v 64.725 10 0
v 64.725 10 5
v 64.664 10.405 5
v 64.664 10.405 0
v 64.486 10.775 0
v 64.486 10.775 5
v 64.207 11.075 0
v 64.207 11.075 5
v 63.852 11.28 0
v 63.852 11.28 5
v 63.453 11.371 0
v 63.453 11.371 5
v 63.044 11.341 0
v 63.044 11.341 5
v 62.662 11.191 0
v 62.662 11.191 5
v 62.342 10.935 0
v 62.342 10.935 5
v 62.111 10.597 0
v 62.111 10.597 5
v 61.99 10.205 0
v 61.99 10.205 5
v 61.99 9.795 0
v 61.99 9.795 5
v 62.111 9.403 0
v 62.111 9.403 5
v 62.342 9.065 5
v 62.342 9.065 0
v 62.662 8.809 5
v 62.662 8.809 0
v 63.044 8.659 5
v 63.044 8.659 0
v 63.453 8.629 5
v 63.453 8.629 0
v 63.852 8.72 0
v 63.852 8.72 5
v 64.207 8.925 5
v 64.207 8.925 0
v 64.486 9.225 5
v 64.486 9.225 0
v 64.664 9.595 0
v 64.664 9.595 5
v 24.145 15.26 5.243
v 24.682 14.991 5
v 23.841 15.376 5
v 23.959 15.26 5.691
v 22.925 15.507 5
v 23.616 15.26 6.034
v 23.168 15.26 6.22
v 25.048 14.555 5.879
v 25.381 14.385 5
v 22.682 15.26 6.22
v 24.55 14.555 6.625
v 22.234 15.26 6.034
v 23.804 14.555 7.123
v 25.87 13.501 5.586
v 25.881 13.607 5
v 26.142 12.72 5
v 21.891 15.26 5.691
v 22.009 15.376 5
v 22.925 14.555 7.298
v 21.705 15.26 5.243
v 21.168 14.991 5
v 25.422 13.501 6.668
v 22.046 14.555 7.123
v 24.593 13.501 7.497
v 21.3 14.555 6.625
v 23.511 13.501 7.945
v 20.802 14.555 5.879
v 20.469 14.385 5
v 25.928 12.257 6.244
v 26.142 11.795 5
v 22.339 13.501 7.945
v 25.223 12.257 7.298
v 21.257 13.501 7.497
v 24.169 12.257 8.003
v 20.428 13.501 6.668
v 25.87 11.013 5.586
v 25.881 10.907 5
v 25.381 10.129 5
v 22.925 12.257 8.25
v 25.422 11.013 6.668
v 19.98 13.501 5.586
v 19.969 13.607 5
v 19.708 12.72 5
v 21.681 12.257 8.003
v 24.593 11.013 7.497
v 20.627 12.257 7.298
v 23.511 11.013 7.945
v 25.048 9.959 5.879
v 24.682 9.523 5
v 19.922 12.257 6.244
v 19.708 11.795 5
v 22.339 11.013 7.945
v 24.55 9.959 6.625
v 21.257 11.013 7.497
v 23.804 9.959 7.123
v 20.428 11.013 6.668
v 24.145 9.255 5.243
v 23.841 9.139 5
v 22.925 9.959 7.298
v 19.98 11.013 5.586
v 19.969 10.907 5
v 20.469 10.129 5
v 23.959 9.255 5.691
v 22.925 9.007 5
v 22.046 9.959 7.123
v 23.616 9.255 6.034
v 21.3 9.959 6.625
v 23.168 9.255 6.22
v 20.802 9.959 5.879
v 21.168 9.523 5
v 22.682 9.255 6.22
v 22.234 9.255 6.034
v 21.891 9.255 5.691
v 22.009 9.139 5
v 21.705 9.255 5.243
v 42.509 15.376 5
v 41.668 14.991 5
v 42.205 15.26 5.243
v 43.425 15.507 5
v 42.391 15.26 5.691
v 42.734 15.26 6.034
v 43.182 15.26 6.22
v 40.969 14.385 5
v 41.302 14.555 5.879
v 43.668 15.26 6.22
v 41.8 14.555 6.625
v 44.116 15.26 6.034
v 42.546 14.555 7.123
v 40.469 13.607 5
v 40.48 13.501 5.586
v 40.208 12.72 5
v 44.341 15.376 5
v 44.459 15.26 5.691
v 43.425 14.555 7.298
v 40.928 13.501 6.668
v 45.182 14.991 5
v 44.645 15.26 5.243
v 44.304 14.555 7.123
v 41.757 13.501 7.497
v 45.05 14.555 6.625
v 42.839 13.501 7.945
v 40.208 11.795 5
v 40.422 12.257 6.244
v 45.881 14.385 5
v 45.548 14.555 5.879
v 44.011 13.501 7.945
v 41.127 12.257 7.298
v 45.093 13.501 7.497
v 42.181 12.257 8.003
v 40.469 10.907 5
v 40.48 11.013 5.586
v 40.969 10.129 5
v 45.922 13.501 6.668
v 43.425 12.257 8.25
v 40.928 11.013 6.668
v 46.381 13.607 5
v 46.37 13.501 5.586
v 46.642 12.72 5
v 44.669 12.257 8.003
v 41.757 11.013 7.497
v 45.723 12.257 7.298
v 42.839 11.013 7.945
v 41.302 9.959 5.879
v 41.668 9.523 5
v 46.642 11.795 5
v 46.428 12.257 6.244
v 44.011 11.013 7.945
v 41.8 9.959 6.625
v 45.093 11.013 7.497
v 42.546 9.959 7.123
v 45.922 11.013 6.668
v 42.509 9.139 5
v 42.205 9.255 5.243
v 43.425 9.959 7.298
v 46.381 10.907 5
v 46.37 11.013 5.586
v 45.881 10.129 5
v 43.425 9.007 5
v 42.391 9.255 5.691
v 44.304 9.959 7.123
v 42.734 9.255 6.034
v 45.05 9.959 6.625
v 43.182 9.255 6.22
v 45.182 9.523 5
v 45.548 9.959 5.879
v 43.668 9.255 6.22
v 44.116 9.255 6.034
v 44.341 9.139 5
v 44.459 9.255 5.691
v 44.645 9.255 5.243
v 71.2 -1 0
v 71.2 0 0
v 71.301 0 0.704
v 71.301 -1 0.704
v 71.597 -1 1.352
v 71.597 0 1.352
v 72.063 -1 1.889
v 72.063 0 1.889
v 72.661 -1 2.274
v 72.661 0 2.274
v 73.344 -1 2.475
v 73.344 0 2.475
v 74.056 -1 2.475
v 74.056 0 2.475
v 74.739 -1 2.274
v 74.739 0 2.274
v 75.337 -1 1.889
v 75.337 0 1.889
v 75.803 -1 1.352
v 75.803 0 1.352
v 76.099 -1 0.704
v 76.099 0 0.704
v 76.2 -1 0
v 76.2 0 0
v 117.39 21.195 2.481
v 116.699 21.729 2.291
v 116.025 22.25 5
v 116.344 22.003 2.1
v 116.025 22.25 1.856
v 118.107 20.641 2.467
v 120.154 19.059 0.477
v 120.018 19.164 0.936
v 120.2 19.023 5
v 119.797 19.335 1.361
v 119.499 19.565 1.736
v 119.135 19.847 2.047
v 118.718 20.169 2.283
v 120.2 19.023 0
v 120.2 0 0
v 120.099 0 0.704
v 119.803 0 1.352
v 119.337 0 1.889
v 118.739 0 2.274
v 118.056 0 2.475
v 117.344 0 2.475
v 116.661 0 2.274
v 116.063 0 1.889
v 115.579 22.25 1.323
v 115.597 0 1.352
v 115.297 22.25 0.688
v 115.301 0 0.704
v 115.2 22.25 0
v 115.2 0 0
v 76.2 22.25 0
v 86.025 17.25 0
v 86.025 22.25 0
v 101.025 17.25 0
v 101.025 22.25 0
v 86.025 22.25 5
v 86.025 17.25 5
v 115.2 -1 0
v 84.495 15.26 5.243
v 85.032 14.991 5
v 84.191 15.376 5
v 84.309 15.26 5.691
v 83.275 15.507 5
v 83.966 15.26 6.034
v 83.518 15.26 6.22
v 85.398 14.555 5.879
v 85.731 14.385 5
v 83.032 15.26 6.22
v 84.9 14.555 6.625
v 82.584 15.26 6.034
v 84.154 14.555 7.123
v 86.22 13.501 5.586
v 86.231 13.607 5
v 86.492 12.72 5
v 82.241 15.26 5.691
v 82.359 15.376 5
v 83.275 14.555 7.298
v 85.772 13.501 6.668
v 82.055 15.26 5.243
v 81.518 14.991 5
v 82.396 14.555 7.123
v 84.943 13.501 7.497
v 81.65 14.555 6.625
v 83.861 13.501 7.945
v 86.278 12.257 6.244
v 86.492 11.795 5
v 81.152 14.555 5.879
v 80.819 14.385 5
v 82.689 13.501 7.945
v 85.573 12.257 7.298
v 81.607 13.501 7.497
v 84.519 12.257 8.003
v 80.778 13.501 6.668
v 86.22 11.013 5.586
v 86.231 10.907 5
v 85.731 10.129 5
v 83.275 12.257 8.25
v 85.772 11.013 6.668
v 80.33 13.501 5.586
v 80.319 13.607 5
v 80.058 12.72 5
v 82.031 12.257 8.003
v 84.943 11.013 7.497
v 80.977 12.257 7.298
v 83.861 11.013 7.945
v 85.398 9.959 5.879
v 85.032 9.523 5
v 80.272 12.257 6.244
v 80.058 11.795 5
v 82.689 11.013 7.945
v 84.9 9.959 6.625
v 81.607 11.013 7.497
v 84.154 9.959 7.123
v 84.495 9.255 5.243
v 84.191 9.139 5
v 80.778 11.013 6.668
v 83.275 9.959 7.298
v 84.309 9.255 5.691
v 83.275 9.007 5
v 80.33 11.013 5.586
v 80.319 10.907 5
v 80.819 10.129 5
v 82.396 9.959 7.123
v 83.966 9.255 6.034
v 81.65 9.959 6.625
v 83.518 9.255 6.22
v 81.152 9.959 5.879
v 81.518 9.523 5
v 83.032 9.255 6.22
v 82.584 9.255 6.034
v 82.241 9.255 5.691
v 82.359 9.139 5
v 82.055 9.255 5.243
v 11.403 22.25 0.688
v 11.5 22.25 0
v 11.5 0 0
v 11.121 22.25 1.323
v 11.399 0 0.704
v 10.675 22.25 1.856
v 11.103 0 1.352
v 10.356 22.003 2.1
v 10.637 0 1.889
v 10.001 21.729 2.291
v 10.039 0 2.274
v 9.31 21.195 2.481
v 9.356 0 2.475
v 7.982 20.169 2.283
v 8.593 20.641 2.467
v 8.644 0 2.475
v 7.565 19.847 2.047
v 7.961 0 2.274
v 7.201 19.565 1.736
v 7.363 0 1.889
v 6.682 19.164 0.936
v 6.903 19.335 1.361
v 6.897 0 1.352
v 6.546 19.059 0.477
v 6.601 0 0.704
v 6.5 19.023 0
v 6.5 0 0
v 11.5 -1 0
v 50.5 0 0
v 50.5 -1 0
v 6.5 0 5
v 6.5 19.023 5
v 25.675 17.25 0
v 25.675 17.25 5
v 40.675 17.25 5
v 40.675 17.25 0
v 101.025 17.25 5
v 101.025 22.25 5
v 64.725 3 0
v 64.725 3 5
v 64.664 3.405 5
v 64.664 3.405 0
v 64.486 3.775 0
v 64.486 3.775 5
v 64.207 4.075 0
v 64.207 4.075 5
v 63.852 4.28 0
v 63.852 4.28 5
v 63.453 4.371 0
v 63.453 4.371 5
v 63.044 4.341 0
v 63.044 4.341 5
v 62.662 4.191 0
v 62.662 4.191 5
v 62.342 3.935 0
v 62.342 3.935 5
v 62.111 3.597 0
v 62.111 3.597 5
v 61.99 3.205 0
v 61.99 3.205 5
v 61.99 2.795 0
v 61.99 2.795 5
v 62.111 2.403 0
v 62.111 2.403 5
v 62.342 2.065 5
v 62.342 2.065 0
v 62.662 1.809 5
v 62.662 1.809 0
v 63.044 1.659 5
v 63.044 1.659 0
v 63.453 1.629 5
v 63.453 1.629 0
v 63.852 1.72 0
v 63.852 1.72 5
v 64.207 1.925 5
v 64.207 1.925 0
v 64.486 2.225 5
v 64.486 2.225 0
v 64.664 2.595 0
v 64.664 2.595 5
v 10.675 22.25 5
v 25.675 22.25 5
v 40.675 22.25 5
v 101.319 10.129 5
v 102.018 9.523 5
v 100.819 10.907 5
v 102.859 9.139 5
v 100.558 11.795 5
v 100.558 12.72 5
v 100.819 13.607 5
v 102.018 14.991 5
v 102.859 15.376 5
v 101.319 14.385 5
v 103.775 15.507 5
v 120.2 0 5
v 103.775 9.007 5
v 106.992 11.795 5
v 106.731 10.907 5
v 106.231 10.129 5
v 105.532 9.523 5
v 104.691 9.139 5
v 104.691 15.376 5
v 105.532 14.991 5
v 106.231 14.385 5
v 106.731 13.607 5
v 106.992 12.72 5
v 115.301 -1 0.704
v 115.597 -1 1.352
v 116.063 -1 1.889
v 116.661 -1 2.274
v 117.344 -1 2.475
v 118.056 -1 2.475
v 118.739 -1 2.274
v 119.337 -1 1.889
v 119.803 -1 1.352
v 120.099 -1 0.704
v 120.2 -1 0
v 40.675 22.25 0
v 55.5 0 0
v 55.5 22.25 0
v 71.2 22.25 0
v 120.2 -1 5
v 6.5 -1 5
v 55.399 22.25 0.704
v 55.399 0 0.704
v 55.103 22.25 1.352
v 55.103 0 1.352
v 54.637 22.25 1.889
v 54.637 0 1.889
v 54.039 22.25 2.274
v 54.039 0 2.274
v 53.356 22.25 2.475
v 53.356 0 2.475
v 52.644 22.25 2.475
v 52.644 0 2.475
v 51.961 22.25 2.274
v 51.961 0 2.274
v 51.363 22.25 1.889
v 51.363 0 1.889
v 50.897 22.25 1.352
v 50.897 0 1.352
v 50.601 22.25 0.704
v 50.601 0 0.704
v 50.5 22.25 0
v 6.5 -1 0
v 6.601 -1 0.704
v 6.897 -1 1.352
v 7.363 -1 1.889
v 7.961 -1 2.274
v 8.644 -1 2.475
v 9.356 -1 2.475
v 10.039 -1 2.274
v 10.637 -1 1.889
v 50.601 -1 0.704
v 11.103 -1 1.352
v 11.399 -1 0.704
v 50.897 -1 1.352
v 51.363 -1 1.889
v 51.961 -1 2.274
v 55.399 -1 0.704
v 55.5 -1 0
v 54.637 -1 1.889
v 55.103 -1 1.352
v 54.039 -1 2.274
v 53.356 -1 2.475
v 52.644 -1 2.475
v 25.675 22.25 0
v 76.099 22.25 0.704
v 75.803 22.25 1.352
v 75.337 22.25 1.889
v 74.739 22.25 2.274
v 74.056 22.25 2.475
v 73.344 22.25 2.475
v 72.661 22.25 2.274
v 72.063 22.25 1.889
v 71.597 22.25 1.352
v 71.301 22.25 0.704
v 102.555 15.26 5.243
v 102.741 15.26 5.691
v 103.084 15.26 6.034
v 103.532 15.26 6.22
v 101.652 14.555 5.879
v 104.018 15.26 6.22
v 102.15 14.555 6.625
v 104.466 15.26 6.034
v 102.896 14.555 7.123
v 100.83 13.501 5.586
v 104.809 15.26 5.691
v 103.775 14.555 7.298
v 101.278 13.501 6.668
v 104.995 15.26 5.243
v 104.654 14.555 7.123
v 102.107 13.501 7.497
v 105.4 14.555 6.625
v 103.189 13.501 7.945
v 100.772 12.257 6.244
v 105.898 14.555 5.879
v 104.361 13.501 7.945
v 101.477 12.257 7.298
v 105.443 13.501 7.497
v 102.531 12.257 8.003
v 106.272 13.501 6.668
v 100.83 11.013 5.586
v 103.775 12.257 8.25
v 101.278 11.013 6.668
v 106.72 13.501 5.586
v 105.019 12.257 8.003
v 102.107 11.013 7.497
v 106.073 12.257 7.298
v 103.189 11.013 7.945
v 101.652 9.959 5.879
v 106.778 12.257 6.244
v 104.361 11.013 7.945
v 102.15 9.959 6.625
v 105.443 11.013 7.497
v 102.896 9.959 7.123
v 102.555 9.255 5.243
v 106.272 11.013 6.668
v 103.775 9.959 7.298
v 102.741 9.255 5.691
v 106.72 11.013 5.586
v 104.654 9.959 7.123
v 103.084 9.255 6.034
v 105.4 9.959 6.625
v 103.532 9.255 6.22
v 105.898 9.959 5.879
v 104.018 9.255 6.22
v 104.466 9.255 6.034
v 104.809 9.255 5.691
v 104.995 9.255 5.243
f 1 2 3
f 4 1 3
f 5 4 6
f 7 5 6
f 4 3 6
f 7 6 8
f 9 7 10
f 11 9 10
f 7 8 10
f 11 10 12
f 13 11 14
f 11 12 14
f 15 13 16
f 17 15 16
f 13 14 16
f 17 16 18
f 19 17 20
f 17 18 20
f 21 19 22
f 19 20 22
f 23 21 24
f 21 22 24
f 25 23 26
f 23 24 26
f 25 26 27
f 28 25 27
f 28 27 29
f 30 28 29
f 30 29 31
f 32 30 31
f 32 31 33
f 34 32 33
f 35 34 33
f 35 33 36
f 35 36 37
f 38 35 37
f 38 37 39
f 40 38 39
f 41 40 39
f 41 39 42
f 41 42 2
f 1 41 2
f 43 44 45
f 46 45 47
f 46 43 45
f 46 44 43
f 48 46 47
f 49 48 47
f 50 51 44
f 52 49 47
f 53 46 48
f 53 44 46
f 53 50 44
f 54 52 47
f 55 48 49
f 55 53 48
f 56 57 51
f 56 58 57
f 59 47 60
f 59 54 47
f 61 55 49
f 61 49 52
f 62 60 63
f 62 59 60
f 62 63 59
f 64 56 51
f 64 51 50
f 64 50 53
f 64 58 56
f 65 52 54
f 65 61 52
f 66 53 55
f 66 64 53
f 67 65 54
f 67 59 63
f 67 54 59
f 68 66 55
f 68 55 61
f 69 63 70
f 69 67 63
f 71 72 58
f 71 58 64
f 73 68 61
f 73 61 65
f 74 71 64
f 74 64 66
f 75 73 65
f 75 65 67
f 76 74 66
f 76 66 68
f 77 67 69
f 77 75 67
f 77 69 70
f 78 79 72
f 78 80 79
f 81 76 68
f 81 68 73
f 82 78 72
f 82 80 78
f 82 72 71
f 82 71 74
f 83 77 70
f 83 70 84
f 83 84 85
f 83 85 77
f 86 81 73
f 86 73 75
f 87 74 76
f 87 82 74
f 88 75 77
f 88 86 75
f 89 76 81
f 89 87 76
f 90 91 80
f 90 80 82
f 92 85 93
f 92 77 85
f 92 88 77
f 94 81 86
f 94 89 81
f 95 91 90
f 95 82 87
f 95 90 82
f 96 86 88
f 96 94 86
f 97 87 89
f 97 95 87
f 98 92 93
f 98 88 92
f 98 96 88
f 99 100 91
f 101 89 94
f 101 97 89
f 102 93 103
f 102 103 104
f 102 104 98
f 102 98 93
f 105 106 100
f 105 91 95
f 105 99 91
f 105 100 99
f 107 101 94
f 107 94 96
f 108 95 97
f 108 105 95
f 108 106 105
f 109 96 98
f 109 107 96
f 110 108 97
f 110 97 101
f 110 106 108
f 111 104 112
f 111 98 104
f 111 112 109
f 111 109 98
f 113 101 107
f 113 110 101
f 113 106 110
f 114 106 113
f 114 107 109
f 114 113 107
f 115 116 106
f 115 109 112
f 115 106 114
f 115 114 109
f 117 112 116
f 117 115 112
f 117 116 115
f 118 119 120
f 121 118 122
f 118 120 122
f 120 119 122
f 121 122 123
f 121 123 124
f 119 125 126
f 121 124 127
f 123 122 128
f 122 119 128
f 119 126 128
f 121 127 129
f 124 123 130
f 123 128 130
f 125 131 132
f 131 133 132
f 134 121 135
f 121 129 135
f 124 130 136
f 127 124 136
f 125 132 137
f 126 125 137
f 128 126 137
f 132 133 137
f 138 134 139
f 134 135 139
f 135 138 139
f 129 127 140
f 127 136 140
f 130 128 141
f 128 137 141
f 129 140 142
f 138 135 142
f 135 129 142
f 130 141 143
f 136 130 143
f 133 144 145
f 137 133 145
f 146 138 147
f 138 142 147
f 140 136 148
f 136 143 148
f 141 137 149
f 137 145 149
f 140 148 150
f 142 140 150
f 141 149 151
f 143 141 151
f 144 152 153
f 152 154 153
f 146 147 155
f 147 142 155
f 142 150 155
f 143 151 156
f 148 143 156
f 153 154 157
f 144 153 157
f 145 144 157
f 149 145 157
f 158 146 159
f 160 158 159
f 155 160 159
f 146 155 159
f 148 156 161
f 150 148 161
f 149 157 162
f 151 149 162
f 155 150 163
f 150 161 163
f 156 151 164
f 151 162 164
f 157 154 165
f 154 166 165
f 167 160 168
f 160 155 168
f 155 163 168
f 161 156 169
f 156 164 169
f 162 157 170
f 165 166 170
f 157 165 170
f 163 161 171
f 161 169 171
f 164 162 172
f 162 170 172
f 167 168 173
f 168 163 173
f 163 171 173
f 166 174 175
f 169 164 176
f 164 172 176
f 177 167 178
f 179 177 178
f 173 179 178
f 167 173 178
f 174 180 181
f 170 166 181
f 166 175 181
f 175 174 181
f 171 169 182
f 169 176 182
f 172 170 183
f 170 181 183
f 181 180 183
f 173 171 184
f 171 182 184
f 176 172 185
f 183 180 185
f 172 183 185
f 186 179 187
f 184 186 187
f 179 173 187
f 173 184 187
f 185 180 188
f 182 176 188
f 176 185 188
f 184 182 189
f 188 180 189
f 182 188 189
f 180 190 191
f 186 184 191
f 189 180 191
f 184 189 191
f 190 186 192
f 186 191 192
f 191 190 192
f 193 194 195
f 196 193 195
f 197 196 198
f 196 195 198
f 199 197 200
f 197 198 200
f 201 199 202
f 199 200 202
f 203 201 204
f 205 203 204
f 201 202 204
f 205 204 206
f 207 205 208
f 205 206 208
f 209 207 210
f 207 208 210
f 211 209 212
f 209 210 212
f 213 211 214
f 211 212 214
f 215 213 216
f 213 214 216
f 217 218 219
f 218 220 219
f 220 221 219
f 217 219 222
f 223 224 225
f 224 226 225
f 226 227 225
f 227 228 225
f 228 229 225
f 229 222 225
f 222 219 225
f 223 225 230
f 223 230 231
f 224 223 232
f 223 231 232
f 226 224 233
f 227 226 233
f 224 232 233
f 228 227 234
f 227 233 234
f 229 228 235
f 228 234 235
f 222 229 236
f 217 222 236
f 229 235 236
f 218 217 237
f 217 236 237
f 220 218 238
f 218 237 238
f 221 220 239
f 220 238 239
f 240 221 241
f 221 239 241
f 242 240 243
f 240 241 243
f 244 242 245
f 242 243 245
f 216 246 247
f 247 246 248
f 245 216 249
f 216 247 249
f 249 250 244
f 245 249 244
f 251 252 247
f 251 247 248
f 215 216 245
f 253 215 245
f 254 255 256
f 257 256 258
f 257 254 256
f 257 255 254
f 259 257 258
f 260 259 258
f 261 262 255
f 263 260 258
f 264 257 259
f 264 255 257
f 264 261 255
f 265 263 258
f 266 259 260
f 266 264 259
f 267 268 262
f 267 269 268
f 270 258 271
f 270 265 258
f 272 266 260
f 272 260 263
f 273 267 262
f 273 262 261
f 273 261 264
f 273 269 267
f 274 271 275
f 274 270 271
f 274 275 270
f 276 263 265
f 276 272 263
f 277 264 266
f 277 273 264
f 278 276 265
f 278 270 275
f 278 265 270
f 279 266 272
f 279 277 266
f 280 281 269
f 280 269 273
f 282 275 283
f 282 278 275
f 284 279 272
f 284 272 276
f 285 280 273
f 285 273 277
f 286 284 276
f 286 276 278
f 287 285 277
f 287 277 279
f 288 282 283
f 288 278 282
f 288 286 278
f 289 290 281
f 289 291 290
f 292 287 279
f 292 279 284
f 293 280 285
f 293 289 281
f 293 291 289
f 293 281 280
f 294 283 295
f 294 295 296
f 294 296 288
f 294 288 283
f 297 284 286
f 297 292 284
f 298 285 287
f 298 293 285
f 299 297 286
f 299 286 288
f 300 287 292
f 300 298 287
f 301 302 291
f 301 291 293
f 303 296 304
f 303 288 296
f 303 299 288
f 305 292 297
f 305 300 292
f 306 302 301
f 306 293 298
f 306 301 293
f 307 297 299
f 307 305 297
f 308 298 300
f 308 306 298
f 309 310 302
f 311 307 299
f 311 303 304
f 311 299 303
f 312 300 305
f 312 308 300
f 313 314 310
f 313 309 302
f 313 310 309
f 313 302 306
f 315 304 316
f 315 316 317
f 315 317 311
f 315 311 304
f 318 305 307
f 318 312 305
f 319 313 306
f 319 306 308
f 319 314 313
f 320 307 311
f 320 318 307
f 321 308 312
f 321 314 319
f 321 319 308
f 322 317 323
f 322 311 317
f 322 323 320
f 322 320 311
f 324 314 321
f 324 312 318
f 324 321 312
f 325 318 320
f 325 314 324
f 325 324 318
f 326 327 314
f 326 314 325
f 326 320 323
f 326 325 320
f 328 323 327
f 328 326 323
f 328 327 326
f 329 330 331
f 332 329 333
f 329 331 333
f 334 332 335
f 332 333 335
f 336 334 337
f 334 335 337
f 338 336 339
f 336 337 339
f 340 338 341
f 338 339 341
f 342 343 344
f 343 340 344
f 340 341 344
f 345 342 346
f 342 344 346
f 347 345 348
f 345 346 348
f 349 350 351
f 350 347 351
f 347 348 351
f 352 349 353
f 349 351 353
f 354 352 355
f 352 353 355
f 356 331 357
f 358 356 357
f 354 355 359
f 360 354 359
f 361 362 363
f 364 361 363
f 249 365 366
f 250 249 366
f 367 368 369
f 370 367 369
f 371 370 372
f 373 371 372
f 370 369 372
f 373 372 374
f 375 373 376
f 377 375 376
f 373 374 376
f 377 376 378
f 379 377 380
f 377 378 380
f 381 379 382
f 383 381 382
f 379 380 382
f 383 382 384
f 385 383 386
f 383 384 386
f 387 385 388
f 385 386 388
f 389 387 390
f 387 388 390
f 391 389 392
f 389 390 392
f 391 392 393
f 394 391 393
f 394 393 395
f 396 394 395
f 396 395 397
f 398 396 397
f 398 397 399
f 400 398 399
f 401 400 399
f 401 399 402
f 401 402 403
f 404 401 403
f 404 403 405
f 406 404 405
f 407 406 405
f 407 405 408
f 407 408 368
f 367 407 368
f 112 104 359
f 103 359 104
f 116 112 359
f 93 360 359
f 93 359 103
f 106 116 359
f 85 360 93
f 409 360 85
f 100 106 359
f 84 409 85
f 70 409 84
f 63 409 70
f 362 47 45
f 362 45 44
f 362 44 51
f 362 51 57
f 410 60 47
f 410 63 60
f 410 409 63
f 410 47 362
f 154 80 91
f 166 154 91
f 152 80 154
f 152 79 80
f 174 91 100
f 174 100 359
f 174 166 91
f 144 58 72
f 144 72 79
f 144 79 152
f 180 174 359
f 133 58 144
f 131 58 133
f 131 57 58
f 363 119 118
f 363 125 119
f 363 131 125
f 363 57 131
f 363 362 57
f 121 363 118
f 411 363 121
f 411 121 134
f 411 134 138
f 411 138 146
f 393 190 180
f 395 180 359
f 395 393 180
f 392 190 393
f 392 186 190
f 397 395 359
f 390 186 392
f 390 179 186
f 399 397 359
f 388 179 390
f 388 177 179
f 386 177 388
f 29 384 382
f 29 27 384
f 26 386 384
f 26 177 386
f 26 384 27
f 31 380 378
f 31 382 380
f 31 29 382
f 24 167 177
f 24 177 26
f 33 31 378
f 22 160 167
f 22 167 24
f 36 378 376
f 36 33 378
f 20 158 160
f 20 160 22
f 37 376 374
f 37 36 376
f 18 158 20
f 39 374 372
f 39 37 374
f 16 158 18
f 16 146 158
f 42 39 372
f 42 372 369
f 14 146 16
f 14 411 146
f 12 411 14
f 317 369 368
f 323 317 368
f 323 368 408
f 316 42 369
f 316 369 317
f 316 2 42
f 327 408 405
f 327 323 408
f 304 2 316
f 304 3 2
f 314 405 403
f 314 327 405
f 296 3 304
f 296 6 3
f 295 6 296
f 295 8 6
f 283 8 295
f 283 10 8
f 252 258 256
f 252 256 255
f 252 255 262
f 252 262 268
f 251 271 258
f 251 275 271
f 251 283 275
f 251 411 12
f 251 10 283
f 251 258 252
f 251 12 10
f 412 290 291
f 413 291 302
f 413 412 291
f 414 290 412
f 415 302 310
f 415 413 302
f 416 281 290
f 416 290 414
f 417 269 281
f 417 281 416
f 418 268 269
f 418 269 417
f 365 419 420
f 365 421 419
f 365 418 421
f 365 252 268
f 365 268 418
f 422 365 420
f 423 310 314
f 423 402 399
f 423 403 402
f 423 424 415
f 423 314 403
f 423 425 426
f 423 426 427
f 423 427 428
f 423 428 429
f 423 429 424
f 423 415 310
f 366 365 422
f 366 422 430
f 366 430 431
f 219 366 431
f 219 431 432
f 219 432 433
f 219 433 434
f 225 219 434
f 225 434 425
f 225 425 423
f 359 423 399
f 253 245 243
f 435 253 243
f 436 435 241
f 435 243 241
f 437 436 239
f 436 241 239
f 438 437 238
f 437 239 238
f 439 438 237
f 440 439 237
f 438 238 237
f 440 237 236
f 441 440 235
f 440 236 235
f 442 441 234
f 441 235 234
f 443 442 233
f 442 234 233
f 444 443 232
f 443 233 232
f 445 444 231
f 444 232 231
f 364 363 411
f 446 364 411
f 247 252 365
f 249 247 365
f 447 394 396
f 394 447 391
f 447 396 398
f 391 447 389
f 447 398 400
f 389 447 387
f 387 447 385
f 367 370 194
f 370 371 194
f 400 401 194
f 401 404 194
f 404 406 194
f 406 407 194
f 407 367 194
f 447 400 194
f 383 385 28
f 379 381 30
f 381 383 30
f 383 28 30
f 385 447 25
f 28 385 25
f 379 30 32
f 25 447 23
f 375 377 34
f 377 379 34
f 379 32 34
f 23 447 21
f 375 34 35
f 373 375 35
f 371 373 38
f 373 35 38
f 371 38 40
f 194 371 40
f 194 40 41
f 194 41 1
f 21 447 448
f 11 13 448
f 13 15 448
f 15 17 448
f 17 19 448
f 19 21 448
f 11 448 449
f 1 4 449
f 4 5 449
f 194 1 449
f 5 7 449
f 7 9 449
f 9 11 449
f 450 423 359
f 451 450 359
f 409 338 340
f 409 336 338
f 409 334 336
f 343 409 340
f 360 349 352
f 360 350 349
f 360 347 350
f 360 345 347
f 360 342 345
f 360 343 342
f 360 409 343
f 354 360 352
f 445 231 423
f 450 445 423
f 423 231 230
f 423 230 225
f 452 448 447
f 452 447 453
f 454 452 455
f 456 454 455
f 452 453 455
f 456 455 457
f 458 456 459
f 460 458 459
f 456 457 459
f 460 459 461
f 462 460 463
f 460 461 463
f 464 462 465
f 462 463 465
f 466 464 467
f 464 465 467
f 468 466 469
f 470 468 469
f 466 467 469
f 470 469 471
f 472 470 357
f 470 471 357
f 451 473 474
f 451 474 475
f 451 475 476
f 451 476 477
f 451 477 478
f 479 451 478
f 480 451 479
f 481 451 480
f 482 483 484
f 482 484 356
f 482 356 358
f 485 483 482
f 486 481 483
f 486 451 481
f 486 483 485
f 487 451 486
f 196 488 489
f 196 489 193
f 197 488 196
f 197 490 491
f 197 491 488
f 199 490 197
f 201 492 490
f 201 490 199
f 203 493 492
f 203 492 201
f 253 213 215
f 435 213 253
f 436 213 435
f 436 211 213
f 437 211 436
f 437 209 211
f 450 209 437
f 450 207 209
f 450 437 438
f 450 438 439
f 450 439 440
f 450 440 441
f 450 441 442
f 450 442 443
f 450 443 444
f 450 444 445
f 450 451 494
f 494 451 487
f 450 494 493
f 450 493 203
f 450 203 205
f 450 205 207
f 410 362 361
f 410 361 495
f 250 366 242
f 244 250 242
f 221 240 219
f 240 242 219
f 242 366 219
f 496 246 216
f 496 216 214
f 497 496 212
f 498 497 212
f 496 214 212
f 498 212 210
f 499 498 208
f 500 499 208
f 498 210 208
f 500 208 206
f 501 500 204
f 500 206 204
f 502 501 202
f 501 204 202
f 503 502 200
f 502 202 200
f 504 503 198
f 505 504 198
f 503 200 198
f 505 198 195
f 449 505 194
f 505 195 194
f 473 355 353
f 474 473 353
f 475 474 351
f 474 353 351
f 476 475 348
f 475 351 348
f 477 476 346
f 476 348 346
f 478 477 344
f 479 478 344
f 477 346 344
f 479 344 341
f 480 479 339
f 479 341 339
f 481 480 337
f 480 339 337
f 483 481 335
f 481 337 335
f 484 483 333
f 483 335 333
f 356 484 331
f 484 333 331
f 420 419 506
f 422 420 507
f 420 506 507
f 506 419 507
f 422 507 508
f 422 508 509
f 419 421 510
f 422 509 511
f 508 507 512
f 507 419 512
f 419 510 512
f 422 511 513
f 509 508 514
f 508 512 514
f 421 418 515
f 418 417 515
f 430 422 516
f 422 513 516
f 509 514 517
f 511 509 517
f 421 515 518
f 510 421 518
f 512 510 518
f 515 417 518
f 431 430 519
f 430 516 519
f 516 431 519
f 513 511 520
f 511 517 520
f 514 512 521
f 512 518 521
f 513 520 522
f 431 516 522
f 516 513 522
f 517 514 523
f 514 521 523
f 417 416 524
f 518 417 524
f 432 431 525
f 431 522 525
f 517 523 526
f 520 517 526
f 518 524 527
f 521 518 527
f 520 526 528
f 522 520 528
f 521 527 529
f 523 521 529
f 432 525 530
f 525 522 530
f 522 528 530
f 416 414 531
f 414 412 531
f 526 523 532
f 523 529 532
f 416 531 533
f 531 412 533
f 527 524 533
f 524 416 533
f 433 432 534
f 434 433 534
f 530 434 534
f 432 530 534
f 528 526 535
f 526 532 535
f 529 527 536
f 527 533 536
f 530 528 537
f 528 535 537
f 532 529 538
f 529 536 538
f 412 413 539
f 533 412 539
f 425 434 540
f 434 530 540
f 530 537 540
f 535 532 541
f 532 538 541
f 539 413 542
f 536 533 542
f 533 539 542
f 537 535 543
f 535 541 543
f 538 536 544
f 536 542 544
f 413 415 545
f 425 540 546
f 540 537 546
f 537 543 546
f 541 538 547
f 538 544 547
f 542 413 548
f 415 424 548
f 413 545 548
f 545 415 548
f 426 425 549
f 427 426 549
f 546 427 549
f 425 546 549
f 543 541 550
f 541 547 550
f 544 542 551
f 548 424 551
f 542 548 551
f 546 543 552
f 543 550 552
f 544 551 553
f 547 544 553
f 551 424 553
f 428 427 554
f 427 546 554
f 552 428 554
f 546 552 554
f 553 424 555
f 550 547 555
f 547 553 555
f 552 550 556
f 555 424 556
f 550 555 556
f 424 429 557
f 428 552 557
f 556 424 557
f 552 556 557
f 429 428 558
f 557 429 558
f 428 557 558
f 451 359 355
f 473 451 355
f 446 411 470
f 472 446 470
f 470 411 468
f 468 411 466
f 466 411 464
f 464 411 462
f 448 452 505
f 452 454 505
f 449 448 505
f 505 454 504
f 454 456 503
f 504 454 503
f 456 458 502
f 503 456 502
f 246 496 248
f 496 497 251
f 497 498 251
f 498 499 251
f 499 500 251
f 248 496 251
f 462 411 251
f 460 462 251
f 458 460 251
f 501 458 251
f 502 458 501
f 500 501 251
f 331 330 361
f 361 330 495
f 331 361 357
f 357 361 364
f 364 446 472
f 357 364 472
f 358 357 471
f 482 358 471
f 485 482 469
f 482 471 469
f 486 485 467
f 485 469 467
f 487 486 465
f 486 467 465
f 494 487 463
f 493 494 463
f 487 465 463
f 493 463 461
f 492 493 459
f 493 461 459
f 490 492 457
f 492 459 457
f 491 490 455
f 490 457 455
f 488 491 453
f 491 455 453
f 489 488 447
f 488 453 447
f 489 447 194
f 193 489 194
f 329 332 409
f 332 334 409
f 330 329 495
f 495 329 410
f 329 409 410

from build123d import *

# Parameters (mm, degrees)
SKETCH1_W                = 126.7
SKETCH1_H                = 14
BRACKETBASE_DEPTH        = 5
SKETCH2_R                = 1.375
MOUNTINGHOLES_DEPTH      = 1
MOUNTINGHOLES_DEPTH_BACK = 6
SKETCH5_W                = 126.7
SKETCH5_H                = 8.25
BASEEXTENSION_DEPTH      = 5
REVOLVE1_ANGLE           = 180
REVOLVE2_ANGLE           = 180
REVOLVE3_ANGLE           = 180
REVOLVE4_ANGLE           = 180
SKETCH9_W                = 15
SKETCH9_H                = 5
CUT_EXTRUDE2_DEPTH       = 4.25
CUT_EXTRUDE2_DEPTH_BACK  = 6
CUT_EXTRUDE3_DEPTH       = 4.25
CUT_EXTRUDE3_DEPTH_BACK  = 6
SKETCH11_R               = 2.5
CUT_EXTRUDE4_DEPTH       = 23.25
SKETCH12_R               = 2.5
CUT_EXTRUDE5_DEPTH       = 23.25
SKETCH13_W               = 6.5
SKETCH13_H               = 5
CUT_EXTRUDE6_DEPTH       = 1.0000001
CUT_EXTRUDE6_DEPTH_BACK  = 23.25
BOSS_EXTRUDE1_DEPTH      = 1


with BuildPart() as part:
    # Sketch1 → bracketBase (new body)
    with BuildSketch(Plane.XY):
        with Locations((63.35, 7)):
            Rectangle(SKETCH1_W, SKETCH1_H)
    extrude(amount=BRACKETBASE_DEPTH)

    # Sketch2 → mountingHoles (cut, two sides)
    with BuildSketch(Plane.XY.offset(5)) as mountingholes_sk:
        with Locations((63.35, 10)):
            Circle(SKETCH2_R)
        with Locations((63.35, 3)):
            Circle(SKETCH2_R)
        with Locations((123.7, 10)):
            Circle(SKETCH2_R)
        with Locations((123.7, 3)):
            Circle(SKETCH2_R)
        with Locations((3, 3)):
            Circle(SKETCH2_R)
        with Locations((3, 10)):
            Circle(SKETCH2_R)
    extrude(amount=MOUNTINGHOLES_DEPTH, mode=Mode.SUBTRACT)
    extrude(mountingholes_sk.sketch, amount=-MOUNTINGHOLES_DEPTH_BACK, mode=Mode.SUBTRACT)

    # Sketch5 → baseExtension (add)
    with BuildSketch(Plane.XY.offset(5)):
        with Locations((63.35, 18.125)):
            Rectangle(SKETCH5_W, SKETCH5_H)
    extrude(amount=-BASEEXTENSION_DEPTH)

    # Sketch4 → Revolve1 (revolve)
    with BuildSketch(Plane.XY.offset(5)):
        with BuildLine():
            Line((43.425, 9.00715266), (43.425, 15.50715266))
            ThreePointArc((43.425, 15.50715266), (40.175, 12.25715266), (43.425, 9.00715266))
        make_face()
    revolve(axis=Axis((43.425, 9.00715266, 5), (0, 1, 0)), revolution_arc=REVOLVE1_ANGLE)

    # Sketch6 → Revolve2 (revolve)
    with BuildSketch(Plane.XY.offset(5)):
        with BuildLine():
            Line((22.925, 9.00715266), (22.925, 15.50715266))
            ThreePointArc((22.925, 15.50715266), (26.175, 12.25715266), (22.925, 9.00715266))
        make_face()
    revolve(axis=Axis((22.925, 9.00715266, 5), (0, -1, 0)), revolution_arc=REVOLVE2_ANGLE)

    # Sketch7 → Revolve3 (revolve)
    with BuildSketch(Plane.XY.offset(5)):
        with BuildLine():
            Line((83.275, 9.00715266), (83.275, 15.50715266))
            ThreePointArc((83.275, 15.50715266), (86.525, 12.25715266), (83.275, 9.00715266))
        make_face()
    revolve(axis=Axis((83.275, 9.00715266, 5), (0, -1, 0)), revolution_arc=REVOLVE3_ANGLE)

    # Sketch8 → Revolve4 (revolve)
    with BuildSketch(Plane.XY.offset(5)):
        with BuildLine():
            Line((103.775, 9.00715266), (103.775, 15.50715266))
            ThreePointArc((103.775, 15.50715266), (100.525, 12.25715266), (103.775, 9.00715266))
        make_face()
    revolve(axis=Axis((103.775, 9.00715266, 5), (0, 1, 0)), revolution_arc=REVOLVE4_ANGLE)

    # Sketch9 → Cut-Extrude2 (cut, two sides)
    with BuildSketch(Plane.XY.offset(5)) as cut_extrude2_sk:
        with Locations((33.175, 19.75)):
            Rectangle(SKETCH9_W, SKETCH9_H)
        with Locations((93.525, 19.75)):
            Rectangle(SKETCH9_W, SKETCH9_H)
    extrude(amount=CUT_EXTRUDE2_DEPTH, mode=Mode.SUBTRACT)
    extrude(cut_extrude2_sk.sketch, amount=-CUT_EXTRUDE2_DEPTH_BACK, mode=Mode.SUBTRACT)

    # Sketch10 → Cut-Extrude3 (cut, two sides)
    with BuildSketch(Plane.XY.offset(5)) as cut_extrude3_sk:
        Polygon((116.025, 22.25), (126.7, 14), (126.7, 22.25), align=None)
        Polygon((0, 14), (0, 22.25), (10.675, 22.25), align=None)
    extrude(amount=CUT_EXTRUDE3_DEPTH, mode=Mode.SUBTRACT)
    extrude(cut_extrude3_sk.sketch, amount=-CUT_EXTRUDE3_DEPTH_BACK, mode=Mode.SUBTRACT)

    # Sketch11 → Cut-Extrude4 (cut, through all)
    with BuildSketch(Plane.XZ):
        with Locations((126.95, 1.155770847)):
            Circle(SKETCH11_R)
        with Locations((-0.25, 1.155770847)):
            Circle(SKETCH11_R)
    extrude(amount=-CUT_EXTRUDE4_DEPTH, mode=Mode.SUBTRACT)

    # Sketch12 → Cut-Extrude5 (cut, through all)
    with BuildSketch(Plane.XZ):
        with Locations((117.7, 0)):
            Circle(SKETCH12_R)
        with Locations((73.7, 0)):
            Circle(SKETCH12_R)
        with Locations((53, 0)):
            Circle(SKETCH12_R)
        with Locations((9, 0)):
            Circle(SKETCH12_R)
    extrude(amount=-CUT_EXTRUDE5_DEPTH, mode=Mode.SUBTRACT)

    # Sketch13 → Cut-Extrude6 (cut, two sides)
    with BuildSketch(Plane.XZ) as cut_extrude6_sk:
        with Locations((123.45, 2.5)):
            Rectangle(SKETCH13_W, SKETCH13_H)
        with Locations((3.25, 2.5)):
            Rectangle(SKETCH13_W, SKETCH13_H)
    extrude(amount=CUT_EXTRUDE6_DEPTH, mode=Mode.SUBTRACT)
    extrude(cut_extrude6_sk.sketch, amount=-CUT_EXTRUDE6_DEPTH_BACK, mode=Mode.SUBTRACT)

    # Sketch14 → Boss-Extrude1 (add)
    with BuildSketch(Plane.XZ):
        with BuildLine():
            Line((120.2, 0), (120.2, 5))
            Line((120.2, 5), (6.5, 5))
            Line((6.5, 5), (6.5, 0))
            ThreePointArc((6.5, 0), (9, 2.5), (11.5, 0))
            Line((11.5, 0), (50.5, 0))
            ThreePointArc((50.5, 0), (53, 2.5), (55.5, 0))
            Line((55.5, 0), (71.2, 0))
            ThreePointArc((71.2, 0), (73.7, 2.5), (76.2, 0))
            Line((76.2, 0), (115.2, 0))
            ThreePointArc((115.2, 0), (117.7, 2.5), (120.2, 0))
        make_face()
    extrude(amount=BOSS_EXTRUDE1_DEPTH)


solid = part.part
